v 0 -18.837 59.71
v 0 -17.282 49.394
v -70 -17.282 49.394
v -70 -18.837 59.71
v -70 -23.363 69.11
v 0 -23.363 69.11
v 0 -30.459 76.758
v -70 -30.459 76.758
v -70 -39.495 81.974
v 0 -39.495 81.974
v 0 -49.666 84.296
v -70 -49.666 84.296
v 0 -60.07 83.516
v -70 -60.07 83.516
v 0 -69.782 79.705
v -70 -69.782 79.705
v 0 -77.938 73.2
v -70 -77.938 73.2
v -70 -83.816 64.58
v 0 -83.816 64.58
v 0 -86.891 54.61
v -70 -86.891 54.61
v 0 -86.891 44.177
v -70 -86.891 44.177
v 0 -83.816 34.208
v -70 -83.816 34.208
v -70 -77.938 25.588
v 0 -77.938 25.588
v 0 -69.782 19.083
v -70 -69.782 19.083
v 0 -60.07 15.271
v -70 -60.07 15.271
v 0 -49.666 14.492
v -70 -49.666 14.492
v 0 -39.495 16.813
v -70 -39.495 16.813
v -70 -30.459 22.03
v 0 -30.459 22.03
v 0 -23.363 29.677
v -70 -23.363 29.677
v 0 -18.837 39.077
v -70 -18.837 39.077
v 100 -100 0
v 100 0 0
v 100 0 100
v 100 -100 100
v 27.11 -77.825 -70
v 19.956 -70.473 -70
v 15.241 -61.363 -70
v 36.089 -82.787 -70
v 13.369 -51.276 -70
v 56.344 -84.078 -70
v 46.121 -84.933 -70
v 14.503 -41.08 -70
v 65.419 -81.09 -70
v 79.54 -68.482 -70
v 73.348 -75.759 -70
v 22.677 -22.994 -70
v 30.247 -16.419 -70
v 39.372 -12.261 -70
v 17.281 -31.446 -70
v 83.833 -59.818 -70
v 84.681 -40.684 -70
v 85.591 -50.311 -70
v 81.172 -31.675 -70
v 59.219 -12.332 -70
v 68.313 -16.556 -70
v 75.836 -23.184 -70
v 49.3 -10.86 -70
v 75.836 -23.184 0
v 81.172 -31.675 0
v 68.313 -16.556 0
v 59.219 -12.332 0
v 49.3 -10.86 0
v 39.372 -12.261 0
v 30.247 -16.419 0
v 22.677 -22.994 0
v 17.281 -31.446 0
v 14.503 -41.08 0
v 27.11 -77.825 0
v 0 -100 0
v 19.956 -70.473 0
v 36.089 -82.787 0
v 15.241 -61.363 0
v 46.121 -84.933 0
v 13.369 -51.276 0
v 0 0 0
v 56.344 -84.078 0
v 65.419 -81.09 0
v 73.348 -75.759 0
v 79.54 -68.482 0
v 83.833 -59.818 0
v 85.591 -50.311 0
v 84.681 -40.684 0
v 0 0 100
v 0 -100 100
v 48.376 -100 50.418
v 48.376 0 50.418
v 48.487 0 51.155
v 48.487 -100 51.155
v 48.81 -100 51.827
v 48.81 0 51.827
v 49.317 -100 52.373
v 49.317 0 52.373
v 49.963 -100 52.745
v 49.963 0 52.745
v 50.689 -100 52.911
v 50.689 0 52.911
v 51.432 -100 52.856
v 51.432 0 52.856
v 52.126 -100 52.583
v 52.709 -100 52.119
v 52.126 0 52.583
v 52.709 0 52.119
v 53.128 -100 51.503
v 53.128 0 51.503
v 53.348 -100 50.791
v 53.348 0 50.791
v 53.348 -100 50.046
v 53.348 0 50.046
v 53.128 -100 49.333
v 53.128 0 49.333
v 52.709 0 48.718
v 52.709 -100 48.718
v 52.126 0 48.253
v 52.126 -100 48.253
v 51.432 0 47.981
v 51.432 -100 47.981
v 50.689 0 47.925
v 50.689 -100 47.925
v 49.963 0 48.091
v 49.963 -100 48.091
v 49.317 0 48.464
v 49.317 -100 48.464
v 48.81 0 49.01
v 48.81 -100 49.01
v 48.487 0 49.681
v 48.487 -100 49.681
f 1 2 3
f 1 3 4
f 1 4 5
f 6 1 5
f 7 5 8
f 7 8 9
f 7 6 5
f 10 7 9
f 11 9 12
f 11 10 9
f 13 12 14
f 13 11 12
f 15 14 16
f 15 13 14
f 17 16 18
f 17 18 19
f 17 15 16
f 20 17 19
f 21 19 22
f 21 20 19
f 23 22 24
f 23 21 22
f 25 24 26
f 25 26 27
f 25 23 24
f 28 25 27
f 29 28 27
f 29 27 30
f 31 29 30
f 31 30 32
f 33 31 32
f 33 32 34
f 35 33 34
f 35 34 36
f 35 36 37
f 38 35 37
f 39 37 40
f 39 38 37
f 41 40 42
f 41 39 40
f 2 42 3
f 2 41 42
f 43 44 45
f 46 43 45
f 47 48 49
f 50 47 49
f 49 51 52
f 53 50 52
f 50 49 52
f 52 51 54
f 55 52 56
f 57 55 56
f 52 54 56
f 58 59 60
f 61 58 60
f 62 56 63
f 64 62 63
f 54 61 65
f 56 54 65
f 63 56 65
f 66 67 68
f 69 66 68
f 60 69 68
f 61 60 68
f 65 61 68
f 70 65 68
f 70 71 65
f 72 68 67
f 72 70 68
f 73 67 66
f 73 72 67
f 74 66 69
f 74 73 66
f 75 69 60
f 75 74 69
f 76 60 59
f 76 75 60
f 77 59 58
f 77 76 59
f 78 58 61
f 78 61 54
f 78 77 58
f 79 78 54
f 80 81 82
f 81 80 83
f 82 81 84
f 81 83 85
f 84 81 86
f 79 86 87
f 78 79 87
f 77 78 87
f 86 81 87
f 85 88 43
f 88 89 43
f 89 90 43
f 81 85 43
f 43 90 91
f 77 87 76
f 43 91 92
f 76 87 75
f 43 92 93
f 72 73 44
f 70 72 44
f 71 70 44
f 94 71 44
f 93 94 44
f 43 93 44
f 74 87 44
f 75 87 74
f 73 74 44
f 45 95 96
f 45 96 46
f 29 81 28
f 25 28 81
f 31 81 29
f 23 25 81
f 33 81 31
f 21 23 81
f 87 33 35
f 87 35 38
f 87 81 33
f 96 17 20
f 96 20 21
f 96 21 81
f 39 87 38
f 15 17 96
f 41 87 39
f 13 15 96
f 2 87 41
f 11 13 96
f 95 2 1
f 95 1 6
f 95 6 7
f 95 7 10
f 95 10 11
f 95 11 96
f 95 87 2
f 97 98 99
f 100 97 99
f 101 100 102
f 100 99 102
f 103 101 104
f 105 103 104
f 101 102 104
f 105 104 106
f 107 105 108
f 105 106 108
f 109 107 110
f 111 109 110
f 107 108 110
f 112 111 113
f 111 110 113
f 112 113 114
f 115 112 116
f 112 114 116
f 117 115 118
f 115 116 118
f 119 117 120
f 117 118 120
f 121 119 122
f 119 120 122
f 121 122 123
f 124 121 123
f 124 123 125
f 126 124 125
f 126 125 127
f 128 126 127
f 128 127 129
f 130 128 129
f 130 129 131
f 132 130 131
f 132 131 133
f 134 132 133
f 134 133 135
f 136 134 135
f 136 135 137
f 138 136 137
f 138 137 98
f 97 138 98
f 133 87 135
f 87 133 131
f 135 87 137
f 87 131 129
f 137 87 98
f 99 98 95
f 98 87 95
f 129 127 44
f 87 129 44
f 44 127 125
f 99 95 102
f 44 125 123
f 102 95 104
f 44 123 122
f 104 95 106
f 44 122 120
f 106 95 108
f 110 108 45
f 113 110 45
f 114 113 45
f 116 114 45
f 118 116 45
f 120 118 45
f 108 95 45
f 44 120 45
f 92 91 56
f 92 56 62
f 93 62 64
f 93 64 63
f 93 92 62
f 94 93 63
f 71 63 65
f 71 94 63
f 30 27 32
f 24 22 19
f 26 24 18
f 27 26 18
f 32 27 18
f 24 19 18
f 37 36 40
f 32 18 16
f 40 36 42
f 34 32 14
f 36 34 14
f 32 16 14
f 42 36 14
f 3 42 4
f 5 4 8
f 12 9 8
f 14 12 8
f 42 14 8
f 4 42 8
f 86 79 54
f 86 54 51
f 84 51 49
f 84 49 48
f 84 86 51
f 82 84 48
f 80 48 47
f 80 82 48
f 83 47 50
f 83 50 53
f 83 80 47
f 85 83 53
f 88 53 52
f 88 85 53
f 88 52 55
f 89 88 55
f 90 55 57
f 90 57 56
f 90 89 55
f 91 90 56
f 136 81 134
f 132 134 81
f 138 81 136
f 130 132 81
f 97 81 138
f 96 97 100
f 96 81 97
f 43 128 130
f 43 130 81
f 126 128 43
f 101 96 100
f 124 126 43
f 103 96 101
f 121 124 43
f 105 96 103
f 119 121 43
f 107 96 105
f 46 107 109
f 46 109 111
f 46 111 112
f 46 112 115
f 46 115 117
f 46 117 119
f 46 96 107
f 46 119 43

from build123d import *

# Parameters (mm, degrees)
F0_W      = 100
F0_H      = 100
F1_DEPTH  = 100
F2_R      = 35
F3_DEPTH  = 70
F4_R      = 35
F5_DEPTH  = 70
F6_R      = 35
F7_DEPTH  = 70
F8_R      = 35
F9_DEPTH  = 70
F11_R     = 35
F12_DEPTH = 70
F13_R     = 35
F14_DEPTH = 25
F10_R     = 35
F15_DEPTH = 70
F17_D     = 5


with BuildPart() as f1:
    # F0 (on Front) → F1 (new body)
    with BuildSketch(Plane.XZ):
        with Locations((50, 50)):
            Rectangle(F0_W, F0_H)
    extrude(amount=F1_DEPTH)

    # F2 (on Top) → F3 (join)
    with BuildSketch(Plane.XY):
        with Locations((48.346177, -50.003812)):
            Circle(F2_R)
    extrude(amount=-F3_DEPTH)

    # F4 (on Top) → F5 (join)
    with BuildSketch(Plane.XY):
        with Locations((49.174994, -45.859754)):
            Circle(F4_R)
    extrude(amount=-F5_DEPTH)

    # F6 (on Top) → F7 (join)
    with BuildSketch(Plane.XY):
        with Locations((48.553377, -49.589396)):
            Circle(F6_R)
    extrude(amount=-F7_DEPTH)

    # F8 (on Top) → F9 (join)
    with BuildSketch(Plane.XY):
        with Locations((50.625414, -48.760593)):
            Circle(F8_R)
    extrude(amount=-F9_DEPTH)

    # F11 (on Top) → F12 (join)
    with BuildSketch(Plane.XY):
        with Locations((50.038069, -49.650535)):
            Circle(F11_R)
    extrude(amount=-F12_DEPTH)

    # F13 (on face) → F14 (join)
    with BuildSketch(Plane.XY.offset(100)):
        with Locations((49.716454, -51.418651)):
            Circle(F13_R)
    extrude(amount=-F14_DEPTH)

    # F10 (on Right) → F15 (join)
    with BuildSketch(Plane.YZ):
        with Locations((-52.281633, 49.393684)):
            Circle(F10_R)
    extrude(amount=-F15_DEPTH)

    # F17 (through all)
    with Locations(Plane.XZ.offset(100)):
        with Locations((50.875958, 50.418209)):
            Hole(F17_D / 2)


solid = f1.part
